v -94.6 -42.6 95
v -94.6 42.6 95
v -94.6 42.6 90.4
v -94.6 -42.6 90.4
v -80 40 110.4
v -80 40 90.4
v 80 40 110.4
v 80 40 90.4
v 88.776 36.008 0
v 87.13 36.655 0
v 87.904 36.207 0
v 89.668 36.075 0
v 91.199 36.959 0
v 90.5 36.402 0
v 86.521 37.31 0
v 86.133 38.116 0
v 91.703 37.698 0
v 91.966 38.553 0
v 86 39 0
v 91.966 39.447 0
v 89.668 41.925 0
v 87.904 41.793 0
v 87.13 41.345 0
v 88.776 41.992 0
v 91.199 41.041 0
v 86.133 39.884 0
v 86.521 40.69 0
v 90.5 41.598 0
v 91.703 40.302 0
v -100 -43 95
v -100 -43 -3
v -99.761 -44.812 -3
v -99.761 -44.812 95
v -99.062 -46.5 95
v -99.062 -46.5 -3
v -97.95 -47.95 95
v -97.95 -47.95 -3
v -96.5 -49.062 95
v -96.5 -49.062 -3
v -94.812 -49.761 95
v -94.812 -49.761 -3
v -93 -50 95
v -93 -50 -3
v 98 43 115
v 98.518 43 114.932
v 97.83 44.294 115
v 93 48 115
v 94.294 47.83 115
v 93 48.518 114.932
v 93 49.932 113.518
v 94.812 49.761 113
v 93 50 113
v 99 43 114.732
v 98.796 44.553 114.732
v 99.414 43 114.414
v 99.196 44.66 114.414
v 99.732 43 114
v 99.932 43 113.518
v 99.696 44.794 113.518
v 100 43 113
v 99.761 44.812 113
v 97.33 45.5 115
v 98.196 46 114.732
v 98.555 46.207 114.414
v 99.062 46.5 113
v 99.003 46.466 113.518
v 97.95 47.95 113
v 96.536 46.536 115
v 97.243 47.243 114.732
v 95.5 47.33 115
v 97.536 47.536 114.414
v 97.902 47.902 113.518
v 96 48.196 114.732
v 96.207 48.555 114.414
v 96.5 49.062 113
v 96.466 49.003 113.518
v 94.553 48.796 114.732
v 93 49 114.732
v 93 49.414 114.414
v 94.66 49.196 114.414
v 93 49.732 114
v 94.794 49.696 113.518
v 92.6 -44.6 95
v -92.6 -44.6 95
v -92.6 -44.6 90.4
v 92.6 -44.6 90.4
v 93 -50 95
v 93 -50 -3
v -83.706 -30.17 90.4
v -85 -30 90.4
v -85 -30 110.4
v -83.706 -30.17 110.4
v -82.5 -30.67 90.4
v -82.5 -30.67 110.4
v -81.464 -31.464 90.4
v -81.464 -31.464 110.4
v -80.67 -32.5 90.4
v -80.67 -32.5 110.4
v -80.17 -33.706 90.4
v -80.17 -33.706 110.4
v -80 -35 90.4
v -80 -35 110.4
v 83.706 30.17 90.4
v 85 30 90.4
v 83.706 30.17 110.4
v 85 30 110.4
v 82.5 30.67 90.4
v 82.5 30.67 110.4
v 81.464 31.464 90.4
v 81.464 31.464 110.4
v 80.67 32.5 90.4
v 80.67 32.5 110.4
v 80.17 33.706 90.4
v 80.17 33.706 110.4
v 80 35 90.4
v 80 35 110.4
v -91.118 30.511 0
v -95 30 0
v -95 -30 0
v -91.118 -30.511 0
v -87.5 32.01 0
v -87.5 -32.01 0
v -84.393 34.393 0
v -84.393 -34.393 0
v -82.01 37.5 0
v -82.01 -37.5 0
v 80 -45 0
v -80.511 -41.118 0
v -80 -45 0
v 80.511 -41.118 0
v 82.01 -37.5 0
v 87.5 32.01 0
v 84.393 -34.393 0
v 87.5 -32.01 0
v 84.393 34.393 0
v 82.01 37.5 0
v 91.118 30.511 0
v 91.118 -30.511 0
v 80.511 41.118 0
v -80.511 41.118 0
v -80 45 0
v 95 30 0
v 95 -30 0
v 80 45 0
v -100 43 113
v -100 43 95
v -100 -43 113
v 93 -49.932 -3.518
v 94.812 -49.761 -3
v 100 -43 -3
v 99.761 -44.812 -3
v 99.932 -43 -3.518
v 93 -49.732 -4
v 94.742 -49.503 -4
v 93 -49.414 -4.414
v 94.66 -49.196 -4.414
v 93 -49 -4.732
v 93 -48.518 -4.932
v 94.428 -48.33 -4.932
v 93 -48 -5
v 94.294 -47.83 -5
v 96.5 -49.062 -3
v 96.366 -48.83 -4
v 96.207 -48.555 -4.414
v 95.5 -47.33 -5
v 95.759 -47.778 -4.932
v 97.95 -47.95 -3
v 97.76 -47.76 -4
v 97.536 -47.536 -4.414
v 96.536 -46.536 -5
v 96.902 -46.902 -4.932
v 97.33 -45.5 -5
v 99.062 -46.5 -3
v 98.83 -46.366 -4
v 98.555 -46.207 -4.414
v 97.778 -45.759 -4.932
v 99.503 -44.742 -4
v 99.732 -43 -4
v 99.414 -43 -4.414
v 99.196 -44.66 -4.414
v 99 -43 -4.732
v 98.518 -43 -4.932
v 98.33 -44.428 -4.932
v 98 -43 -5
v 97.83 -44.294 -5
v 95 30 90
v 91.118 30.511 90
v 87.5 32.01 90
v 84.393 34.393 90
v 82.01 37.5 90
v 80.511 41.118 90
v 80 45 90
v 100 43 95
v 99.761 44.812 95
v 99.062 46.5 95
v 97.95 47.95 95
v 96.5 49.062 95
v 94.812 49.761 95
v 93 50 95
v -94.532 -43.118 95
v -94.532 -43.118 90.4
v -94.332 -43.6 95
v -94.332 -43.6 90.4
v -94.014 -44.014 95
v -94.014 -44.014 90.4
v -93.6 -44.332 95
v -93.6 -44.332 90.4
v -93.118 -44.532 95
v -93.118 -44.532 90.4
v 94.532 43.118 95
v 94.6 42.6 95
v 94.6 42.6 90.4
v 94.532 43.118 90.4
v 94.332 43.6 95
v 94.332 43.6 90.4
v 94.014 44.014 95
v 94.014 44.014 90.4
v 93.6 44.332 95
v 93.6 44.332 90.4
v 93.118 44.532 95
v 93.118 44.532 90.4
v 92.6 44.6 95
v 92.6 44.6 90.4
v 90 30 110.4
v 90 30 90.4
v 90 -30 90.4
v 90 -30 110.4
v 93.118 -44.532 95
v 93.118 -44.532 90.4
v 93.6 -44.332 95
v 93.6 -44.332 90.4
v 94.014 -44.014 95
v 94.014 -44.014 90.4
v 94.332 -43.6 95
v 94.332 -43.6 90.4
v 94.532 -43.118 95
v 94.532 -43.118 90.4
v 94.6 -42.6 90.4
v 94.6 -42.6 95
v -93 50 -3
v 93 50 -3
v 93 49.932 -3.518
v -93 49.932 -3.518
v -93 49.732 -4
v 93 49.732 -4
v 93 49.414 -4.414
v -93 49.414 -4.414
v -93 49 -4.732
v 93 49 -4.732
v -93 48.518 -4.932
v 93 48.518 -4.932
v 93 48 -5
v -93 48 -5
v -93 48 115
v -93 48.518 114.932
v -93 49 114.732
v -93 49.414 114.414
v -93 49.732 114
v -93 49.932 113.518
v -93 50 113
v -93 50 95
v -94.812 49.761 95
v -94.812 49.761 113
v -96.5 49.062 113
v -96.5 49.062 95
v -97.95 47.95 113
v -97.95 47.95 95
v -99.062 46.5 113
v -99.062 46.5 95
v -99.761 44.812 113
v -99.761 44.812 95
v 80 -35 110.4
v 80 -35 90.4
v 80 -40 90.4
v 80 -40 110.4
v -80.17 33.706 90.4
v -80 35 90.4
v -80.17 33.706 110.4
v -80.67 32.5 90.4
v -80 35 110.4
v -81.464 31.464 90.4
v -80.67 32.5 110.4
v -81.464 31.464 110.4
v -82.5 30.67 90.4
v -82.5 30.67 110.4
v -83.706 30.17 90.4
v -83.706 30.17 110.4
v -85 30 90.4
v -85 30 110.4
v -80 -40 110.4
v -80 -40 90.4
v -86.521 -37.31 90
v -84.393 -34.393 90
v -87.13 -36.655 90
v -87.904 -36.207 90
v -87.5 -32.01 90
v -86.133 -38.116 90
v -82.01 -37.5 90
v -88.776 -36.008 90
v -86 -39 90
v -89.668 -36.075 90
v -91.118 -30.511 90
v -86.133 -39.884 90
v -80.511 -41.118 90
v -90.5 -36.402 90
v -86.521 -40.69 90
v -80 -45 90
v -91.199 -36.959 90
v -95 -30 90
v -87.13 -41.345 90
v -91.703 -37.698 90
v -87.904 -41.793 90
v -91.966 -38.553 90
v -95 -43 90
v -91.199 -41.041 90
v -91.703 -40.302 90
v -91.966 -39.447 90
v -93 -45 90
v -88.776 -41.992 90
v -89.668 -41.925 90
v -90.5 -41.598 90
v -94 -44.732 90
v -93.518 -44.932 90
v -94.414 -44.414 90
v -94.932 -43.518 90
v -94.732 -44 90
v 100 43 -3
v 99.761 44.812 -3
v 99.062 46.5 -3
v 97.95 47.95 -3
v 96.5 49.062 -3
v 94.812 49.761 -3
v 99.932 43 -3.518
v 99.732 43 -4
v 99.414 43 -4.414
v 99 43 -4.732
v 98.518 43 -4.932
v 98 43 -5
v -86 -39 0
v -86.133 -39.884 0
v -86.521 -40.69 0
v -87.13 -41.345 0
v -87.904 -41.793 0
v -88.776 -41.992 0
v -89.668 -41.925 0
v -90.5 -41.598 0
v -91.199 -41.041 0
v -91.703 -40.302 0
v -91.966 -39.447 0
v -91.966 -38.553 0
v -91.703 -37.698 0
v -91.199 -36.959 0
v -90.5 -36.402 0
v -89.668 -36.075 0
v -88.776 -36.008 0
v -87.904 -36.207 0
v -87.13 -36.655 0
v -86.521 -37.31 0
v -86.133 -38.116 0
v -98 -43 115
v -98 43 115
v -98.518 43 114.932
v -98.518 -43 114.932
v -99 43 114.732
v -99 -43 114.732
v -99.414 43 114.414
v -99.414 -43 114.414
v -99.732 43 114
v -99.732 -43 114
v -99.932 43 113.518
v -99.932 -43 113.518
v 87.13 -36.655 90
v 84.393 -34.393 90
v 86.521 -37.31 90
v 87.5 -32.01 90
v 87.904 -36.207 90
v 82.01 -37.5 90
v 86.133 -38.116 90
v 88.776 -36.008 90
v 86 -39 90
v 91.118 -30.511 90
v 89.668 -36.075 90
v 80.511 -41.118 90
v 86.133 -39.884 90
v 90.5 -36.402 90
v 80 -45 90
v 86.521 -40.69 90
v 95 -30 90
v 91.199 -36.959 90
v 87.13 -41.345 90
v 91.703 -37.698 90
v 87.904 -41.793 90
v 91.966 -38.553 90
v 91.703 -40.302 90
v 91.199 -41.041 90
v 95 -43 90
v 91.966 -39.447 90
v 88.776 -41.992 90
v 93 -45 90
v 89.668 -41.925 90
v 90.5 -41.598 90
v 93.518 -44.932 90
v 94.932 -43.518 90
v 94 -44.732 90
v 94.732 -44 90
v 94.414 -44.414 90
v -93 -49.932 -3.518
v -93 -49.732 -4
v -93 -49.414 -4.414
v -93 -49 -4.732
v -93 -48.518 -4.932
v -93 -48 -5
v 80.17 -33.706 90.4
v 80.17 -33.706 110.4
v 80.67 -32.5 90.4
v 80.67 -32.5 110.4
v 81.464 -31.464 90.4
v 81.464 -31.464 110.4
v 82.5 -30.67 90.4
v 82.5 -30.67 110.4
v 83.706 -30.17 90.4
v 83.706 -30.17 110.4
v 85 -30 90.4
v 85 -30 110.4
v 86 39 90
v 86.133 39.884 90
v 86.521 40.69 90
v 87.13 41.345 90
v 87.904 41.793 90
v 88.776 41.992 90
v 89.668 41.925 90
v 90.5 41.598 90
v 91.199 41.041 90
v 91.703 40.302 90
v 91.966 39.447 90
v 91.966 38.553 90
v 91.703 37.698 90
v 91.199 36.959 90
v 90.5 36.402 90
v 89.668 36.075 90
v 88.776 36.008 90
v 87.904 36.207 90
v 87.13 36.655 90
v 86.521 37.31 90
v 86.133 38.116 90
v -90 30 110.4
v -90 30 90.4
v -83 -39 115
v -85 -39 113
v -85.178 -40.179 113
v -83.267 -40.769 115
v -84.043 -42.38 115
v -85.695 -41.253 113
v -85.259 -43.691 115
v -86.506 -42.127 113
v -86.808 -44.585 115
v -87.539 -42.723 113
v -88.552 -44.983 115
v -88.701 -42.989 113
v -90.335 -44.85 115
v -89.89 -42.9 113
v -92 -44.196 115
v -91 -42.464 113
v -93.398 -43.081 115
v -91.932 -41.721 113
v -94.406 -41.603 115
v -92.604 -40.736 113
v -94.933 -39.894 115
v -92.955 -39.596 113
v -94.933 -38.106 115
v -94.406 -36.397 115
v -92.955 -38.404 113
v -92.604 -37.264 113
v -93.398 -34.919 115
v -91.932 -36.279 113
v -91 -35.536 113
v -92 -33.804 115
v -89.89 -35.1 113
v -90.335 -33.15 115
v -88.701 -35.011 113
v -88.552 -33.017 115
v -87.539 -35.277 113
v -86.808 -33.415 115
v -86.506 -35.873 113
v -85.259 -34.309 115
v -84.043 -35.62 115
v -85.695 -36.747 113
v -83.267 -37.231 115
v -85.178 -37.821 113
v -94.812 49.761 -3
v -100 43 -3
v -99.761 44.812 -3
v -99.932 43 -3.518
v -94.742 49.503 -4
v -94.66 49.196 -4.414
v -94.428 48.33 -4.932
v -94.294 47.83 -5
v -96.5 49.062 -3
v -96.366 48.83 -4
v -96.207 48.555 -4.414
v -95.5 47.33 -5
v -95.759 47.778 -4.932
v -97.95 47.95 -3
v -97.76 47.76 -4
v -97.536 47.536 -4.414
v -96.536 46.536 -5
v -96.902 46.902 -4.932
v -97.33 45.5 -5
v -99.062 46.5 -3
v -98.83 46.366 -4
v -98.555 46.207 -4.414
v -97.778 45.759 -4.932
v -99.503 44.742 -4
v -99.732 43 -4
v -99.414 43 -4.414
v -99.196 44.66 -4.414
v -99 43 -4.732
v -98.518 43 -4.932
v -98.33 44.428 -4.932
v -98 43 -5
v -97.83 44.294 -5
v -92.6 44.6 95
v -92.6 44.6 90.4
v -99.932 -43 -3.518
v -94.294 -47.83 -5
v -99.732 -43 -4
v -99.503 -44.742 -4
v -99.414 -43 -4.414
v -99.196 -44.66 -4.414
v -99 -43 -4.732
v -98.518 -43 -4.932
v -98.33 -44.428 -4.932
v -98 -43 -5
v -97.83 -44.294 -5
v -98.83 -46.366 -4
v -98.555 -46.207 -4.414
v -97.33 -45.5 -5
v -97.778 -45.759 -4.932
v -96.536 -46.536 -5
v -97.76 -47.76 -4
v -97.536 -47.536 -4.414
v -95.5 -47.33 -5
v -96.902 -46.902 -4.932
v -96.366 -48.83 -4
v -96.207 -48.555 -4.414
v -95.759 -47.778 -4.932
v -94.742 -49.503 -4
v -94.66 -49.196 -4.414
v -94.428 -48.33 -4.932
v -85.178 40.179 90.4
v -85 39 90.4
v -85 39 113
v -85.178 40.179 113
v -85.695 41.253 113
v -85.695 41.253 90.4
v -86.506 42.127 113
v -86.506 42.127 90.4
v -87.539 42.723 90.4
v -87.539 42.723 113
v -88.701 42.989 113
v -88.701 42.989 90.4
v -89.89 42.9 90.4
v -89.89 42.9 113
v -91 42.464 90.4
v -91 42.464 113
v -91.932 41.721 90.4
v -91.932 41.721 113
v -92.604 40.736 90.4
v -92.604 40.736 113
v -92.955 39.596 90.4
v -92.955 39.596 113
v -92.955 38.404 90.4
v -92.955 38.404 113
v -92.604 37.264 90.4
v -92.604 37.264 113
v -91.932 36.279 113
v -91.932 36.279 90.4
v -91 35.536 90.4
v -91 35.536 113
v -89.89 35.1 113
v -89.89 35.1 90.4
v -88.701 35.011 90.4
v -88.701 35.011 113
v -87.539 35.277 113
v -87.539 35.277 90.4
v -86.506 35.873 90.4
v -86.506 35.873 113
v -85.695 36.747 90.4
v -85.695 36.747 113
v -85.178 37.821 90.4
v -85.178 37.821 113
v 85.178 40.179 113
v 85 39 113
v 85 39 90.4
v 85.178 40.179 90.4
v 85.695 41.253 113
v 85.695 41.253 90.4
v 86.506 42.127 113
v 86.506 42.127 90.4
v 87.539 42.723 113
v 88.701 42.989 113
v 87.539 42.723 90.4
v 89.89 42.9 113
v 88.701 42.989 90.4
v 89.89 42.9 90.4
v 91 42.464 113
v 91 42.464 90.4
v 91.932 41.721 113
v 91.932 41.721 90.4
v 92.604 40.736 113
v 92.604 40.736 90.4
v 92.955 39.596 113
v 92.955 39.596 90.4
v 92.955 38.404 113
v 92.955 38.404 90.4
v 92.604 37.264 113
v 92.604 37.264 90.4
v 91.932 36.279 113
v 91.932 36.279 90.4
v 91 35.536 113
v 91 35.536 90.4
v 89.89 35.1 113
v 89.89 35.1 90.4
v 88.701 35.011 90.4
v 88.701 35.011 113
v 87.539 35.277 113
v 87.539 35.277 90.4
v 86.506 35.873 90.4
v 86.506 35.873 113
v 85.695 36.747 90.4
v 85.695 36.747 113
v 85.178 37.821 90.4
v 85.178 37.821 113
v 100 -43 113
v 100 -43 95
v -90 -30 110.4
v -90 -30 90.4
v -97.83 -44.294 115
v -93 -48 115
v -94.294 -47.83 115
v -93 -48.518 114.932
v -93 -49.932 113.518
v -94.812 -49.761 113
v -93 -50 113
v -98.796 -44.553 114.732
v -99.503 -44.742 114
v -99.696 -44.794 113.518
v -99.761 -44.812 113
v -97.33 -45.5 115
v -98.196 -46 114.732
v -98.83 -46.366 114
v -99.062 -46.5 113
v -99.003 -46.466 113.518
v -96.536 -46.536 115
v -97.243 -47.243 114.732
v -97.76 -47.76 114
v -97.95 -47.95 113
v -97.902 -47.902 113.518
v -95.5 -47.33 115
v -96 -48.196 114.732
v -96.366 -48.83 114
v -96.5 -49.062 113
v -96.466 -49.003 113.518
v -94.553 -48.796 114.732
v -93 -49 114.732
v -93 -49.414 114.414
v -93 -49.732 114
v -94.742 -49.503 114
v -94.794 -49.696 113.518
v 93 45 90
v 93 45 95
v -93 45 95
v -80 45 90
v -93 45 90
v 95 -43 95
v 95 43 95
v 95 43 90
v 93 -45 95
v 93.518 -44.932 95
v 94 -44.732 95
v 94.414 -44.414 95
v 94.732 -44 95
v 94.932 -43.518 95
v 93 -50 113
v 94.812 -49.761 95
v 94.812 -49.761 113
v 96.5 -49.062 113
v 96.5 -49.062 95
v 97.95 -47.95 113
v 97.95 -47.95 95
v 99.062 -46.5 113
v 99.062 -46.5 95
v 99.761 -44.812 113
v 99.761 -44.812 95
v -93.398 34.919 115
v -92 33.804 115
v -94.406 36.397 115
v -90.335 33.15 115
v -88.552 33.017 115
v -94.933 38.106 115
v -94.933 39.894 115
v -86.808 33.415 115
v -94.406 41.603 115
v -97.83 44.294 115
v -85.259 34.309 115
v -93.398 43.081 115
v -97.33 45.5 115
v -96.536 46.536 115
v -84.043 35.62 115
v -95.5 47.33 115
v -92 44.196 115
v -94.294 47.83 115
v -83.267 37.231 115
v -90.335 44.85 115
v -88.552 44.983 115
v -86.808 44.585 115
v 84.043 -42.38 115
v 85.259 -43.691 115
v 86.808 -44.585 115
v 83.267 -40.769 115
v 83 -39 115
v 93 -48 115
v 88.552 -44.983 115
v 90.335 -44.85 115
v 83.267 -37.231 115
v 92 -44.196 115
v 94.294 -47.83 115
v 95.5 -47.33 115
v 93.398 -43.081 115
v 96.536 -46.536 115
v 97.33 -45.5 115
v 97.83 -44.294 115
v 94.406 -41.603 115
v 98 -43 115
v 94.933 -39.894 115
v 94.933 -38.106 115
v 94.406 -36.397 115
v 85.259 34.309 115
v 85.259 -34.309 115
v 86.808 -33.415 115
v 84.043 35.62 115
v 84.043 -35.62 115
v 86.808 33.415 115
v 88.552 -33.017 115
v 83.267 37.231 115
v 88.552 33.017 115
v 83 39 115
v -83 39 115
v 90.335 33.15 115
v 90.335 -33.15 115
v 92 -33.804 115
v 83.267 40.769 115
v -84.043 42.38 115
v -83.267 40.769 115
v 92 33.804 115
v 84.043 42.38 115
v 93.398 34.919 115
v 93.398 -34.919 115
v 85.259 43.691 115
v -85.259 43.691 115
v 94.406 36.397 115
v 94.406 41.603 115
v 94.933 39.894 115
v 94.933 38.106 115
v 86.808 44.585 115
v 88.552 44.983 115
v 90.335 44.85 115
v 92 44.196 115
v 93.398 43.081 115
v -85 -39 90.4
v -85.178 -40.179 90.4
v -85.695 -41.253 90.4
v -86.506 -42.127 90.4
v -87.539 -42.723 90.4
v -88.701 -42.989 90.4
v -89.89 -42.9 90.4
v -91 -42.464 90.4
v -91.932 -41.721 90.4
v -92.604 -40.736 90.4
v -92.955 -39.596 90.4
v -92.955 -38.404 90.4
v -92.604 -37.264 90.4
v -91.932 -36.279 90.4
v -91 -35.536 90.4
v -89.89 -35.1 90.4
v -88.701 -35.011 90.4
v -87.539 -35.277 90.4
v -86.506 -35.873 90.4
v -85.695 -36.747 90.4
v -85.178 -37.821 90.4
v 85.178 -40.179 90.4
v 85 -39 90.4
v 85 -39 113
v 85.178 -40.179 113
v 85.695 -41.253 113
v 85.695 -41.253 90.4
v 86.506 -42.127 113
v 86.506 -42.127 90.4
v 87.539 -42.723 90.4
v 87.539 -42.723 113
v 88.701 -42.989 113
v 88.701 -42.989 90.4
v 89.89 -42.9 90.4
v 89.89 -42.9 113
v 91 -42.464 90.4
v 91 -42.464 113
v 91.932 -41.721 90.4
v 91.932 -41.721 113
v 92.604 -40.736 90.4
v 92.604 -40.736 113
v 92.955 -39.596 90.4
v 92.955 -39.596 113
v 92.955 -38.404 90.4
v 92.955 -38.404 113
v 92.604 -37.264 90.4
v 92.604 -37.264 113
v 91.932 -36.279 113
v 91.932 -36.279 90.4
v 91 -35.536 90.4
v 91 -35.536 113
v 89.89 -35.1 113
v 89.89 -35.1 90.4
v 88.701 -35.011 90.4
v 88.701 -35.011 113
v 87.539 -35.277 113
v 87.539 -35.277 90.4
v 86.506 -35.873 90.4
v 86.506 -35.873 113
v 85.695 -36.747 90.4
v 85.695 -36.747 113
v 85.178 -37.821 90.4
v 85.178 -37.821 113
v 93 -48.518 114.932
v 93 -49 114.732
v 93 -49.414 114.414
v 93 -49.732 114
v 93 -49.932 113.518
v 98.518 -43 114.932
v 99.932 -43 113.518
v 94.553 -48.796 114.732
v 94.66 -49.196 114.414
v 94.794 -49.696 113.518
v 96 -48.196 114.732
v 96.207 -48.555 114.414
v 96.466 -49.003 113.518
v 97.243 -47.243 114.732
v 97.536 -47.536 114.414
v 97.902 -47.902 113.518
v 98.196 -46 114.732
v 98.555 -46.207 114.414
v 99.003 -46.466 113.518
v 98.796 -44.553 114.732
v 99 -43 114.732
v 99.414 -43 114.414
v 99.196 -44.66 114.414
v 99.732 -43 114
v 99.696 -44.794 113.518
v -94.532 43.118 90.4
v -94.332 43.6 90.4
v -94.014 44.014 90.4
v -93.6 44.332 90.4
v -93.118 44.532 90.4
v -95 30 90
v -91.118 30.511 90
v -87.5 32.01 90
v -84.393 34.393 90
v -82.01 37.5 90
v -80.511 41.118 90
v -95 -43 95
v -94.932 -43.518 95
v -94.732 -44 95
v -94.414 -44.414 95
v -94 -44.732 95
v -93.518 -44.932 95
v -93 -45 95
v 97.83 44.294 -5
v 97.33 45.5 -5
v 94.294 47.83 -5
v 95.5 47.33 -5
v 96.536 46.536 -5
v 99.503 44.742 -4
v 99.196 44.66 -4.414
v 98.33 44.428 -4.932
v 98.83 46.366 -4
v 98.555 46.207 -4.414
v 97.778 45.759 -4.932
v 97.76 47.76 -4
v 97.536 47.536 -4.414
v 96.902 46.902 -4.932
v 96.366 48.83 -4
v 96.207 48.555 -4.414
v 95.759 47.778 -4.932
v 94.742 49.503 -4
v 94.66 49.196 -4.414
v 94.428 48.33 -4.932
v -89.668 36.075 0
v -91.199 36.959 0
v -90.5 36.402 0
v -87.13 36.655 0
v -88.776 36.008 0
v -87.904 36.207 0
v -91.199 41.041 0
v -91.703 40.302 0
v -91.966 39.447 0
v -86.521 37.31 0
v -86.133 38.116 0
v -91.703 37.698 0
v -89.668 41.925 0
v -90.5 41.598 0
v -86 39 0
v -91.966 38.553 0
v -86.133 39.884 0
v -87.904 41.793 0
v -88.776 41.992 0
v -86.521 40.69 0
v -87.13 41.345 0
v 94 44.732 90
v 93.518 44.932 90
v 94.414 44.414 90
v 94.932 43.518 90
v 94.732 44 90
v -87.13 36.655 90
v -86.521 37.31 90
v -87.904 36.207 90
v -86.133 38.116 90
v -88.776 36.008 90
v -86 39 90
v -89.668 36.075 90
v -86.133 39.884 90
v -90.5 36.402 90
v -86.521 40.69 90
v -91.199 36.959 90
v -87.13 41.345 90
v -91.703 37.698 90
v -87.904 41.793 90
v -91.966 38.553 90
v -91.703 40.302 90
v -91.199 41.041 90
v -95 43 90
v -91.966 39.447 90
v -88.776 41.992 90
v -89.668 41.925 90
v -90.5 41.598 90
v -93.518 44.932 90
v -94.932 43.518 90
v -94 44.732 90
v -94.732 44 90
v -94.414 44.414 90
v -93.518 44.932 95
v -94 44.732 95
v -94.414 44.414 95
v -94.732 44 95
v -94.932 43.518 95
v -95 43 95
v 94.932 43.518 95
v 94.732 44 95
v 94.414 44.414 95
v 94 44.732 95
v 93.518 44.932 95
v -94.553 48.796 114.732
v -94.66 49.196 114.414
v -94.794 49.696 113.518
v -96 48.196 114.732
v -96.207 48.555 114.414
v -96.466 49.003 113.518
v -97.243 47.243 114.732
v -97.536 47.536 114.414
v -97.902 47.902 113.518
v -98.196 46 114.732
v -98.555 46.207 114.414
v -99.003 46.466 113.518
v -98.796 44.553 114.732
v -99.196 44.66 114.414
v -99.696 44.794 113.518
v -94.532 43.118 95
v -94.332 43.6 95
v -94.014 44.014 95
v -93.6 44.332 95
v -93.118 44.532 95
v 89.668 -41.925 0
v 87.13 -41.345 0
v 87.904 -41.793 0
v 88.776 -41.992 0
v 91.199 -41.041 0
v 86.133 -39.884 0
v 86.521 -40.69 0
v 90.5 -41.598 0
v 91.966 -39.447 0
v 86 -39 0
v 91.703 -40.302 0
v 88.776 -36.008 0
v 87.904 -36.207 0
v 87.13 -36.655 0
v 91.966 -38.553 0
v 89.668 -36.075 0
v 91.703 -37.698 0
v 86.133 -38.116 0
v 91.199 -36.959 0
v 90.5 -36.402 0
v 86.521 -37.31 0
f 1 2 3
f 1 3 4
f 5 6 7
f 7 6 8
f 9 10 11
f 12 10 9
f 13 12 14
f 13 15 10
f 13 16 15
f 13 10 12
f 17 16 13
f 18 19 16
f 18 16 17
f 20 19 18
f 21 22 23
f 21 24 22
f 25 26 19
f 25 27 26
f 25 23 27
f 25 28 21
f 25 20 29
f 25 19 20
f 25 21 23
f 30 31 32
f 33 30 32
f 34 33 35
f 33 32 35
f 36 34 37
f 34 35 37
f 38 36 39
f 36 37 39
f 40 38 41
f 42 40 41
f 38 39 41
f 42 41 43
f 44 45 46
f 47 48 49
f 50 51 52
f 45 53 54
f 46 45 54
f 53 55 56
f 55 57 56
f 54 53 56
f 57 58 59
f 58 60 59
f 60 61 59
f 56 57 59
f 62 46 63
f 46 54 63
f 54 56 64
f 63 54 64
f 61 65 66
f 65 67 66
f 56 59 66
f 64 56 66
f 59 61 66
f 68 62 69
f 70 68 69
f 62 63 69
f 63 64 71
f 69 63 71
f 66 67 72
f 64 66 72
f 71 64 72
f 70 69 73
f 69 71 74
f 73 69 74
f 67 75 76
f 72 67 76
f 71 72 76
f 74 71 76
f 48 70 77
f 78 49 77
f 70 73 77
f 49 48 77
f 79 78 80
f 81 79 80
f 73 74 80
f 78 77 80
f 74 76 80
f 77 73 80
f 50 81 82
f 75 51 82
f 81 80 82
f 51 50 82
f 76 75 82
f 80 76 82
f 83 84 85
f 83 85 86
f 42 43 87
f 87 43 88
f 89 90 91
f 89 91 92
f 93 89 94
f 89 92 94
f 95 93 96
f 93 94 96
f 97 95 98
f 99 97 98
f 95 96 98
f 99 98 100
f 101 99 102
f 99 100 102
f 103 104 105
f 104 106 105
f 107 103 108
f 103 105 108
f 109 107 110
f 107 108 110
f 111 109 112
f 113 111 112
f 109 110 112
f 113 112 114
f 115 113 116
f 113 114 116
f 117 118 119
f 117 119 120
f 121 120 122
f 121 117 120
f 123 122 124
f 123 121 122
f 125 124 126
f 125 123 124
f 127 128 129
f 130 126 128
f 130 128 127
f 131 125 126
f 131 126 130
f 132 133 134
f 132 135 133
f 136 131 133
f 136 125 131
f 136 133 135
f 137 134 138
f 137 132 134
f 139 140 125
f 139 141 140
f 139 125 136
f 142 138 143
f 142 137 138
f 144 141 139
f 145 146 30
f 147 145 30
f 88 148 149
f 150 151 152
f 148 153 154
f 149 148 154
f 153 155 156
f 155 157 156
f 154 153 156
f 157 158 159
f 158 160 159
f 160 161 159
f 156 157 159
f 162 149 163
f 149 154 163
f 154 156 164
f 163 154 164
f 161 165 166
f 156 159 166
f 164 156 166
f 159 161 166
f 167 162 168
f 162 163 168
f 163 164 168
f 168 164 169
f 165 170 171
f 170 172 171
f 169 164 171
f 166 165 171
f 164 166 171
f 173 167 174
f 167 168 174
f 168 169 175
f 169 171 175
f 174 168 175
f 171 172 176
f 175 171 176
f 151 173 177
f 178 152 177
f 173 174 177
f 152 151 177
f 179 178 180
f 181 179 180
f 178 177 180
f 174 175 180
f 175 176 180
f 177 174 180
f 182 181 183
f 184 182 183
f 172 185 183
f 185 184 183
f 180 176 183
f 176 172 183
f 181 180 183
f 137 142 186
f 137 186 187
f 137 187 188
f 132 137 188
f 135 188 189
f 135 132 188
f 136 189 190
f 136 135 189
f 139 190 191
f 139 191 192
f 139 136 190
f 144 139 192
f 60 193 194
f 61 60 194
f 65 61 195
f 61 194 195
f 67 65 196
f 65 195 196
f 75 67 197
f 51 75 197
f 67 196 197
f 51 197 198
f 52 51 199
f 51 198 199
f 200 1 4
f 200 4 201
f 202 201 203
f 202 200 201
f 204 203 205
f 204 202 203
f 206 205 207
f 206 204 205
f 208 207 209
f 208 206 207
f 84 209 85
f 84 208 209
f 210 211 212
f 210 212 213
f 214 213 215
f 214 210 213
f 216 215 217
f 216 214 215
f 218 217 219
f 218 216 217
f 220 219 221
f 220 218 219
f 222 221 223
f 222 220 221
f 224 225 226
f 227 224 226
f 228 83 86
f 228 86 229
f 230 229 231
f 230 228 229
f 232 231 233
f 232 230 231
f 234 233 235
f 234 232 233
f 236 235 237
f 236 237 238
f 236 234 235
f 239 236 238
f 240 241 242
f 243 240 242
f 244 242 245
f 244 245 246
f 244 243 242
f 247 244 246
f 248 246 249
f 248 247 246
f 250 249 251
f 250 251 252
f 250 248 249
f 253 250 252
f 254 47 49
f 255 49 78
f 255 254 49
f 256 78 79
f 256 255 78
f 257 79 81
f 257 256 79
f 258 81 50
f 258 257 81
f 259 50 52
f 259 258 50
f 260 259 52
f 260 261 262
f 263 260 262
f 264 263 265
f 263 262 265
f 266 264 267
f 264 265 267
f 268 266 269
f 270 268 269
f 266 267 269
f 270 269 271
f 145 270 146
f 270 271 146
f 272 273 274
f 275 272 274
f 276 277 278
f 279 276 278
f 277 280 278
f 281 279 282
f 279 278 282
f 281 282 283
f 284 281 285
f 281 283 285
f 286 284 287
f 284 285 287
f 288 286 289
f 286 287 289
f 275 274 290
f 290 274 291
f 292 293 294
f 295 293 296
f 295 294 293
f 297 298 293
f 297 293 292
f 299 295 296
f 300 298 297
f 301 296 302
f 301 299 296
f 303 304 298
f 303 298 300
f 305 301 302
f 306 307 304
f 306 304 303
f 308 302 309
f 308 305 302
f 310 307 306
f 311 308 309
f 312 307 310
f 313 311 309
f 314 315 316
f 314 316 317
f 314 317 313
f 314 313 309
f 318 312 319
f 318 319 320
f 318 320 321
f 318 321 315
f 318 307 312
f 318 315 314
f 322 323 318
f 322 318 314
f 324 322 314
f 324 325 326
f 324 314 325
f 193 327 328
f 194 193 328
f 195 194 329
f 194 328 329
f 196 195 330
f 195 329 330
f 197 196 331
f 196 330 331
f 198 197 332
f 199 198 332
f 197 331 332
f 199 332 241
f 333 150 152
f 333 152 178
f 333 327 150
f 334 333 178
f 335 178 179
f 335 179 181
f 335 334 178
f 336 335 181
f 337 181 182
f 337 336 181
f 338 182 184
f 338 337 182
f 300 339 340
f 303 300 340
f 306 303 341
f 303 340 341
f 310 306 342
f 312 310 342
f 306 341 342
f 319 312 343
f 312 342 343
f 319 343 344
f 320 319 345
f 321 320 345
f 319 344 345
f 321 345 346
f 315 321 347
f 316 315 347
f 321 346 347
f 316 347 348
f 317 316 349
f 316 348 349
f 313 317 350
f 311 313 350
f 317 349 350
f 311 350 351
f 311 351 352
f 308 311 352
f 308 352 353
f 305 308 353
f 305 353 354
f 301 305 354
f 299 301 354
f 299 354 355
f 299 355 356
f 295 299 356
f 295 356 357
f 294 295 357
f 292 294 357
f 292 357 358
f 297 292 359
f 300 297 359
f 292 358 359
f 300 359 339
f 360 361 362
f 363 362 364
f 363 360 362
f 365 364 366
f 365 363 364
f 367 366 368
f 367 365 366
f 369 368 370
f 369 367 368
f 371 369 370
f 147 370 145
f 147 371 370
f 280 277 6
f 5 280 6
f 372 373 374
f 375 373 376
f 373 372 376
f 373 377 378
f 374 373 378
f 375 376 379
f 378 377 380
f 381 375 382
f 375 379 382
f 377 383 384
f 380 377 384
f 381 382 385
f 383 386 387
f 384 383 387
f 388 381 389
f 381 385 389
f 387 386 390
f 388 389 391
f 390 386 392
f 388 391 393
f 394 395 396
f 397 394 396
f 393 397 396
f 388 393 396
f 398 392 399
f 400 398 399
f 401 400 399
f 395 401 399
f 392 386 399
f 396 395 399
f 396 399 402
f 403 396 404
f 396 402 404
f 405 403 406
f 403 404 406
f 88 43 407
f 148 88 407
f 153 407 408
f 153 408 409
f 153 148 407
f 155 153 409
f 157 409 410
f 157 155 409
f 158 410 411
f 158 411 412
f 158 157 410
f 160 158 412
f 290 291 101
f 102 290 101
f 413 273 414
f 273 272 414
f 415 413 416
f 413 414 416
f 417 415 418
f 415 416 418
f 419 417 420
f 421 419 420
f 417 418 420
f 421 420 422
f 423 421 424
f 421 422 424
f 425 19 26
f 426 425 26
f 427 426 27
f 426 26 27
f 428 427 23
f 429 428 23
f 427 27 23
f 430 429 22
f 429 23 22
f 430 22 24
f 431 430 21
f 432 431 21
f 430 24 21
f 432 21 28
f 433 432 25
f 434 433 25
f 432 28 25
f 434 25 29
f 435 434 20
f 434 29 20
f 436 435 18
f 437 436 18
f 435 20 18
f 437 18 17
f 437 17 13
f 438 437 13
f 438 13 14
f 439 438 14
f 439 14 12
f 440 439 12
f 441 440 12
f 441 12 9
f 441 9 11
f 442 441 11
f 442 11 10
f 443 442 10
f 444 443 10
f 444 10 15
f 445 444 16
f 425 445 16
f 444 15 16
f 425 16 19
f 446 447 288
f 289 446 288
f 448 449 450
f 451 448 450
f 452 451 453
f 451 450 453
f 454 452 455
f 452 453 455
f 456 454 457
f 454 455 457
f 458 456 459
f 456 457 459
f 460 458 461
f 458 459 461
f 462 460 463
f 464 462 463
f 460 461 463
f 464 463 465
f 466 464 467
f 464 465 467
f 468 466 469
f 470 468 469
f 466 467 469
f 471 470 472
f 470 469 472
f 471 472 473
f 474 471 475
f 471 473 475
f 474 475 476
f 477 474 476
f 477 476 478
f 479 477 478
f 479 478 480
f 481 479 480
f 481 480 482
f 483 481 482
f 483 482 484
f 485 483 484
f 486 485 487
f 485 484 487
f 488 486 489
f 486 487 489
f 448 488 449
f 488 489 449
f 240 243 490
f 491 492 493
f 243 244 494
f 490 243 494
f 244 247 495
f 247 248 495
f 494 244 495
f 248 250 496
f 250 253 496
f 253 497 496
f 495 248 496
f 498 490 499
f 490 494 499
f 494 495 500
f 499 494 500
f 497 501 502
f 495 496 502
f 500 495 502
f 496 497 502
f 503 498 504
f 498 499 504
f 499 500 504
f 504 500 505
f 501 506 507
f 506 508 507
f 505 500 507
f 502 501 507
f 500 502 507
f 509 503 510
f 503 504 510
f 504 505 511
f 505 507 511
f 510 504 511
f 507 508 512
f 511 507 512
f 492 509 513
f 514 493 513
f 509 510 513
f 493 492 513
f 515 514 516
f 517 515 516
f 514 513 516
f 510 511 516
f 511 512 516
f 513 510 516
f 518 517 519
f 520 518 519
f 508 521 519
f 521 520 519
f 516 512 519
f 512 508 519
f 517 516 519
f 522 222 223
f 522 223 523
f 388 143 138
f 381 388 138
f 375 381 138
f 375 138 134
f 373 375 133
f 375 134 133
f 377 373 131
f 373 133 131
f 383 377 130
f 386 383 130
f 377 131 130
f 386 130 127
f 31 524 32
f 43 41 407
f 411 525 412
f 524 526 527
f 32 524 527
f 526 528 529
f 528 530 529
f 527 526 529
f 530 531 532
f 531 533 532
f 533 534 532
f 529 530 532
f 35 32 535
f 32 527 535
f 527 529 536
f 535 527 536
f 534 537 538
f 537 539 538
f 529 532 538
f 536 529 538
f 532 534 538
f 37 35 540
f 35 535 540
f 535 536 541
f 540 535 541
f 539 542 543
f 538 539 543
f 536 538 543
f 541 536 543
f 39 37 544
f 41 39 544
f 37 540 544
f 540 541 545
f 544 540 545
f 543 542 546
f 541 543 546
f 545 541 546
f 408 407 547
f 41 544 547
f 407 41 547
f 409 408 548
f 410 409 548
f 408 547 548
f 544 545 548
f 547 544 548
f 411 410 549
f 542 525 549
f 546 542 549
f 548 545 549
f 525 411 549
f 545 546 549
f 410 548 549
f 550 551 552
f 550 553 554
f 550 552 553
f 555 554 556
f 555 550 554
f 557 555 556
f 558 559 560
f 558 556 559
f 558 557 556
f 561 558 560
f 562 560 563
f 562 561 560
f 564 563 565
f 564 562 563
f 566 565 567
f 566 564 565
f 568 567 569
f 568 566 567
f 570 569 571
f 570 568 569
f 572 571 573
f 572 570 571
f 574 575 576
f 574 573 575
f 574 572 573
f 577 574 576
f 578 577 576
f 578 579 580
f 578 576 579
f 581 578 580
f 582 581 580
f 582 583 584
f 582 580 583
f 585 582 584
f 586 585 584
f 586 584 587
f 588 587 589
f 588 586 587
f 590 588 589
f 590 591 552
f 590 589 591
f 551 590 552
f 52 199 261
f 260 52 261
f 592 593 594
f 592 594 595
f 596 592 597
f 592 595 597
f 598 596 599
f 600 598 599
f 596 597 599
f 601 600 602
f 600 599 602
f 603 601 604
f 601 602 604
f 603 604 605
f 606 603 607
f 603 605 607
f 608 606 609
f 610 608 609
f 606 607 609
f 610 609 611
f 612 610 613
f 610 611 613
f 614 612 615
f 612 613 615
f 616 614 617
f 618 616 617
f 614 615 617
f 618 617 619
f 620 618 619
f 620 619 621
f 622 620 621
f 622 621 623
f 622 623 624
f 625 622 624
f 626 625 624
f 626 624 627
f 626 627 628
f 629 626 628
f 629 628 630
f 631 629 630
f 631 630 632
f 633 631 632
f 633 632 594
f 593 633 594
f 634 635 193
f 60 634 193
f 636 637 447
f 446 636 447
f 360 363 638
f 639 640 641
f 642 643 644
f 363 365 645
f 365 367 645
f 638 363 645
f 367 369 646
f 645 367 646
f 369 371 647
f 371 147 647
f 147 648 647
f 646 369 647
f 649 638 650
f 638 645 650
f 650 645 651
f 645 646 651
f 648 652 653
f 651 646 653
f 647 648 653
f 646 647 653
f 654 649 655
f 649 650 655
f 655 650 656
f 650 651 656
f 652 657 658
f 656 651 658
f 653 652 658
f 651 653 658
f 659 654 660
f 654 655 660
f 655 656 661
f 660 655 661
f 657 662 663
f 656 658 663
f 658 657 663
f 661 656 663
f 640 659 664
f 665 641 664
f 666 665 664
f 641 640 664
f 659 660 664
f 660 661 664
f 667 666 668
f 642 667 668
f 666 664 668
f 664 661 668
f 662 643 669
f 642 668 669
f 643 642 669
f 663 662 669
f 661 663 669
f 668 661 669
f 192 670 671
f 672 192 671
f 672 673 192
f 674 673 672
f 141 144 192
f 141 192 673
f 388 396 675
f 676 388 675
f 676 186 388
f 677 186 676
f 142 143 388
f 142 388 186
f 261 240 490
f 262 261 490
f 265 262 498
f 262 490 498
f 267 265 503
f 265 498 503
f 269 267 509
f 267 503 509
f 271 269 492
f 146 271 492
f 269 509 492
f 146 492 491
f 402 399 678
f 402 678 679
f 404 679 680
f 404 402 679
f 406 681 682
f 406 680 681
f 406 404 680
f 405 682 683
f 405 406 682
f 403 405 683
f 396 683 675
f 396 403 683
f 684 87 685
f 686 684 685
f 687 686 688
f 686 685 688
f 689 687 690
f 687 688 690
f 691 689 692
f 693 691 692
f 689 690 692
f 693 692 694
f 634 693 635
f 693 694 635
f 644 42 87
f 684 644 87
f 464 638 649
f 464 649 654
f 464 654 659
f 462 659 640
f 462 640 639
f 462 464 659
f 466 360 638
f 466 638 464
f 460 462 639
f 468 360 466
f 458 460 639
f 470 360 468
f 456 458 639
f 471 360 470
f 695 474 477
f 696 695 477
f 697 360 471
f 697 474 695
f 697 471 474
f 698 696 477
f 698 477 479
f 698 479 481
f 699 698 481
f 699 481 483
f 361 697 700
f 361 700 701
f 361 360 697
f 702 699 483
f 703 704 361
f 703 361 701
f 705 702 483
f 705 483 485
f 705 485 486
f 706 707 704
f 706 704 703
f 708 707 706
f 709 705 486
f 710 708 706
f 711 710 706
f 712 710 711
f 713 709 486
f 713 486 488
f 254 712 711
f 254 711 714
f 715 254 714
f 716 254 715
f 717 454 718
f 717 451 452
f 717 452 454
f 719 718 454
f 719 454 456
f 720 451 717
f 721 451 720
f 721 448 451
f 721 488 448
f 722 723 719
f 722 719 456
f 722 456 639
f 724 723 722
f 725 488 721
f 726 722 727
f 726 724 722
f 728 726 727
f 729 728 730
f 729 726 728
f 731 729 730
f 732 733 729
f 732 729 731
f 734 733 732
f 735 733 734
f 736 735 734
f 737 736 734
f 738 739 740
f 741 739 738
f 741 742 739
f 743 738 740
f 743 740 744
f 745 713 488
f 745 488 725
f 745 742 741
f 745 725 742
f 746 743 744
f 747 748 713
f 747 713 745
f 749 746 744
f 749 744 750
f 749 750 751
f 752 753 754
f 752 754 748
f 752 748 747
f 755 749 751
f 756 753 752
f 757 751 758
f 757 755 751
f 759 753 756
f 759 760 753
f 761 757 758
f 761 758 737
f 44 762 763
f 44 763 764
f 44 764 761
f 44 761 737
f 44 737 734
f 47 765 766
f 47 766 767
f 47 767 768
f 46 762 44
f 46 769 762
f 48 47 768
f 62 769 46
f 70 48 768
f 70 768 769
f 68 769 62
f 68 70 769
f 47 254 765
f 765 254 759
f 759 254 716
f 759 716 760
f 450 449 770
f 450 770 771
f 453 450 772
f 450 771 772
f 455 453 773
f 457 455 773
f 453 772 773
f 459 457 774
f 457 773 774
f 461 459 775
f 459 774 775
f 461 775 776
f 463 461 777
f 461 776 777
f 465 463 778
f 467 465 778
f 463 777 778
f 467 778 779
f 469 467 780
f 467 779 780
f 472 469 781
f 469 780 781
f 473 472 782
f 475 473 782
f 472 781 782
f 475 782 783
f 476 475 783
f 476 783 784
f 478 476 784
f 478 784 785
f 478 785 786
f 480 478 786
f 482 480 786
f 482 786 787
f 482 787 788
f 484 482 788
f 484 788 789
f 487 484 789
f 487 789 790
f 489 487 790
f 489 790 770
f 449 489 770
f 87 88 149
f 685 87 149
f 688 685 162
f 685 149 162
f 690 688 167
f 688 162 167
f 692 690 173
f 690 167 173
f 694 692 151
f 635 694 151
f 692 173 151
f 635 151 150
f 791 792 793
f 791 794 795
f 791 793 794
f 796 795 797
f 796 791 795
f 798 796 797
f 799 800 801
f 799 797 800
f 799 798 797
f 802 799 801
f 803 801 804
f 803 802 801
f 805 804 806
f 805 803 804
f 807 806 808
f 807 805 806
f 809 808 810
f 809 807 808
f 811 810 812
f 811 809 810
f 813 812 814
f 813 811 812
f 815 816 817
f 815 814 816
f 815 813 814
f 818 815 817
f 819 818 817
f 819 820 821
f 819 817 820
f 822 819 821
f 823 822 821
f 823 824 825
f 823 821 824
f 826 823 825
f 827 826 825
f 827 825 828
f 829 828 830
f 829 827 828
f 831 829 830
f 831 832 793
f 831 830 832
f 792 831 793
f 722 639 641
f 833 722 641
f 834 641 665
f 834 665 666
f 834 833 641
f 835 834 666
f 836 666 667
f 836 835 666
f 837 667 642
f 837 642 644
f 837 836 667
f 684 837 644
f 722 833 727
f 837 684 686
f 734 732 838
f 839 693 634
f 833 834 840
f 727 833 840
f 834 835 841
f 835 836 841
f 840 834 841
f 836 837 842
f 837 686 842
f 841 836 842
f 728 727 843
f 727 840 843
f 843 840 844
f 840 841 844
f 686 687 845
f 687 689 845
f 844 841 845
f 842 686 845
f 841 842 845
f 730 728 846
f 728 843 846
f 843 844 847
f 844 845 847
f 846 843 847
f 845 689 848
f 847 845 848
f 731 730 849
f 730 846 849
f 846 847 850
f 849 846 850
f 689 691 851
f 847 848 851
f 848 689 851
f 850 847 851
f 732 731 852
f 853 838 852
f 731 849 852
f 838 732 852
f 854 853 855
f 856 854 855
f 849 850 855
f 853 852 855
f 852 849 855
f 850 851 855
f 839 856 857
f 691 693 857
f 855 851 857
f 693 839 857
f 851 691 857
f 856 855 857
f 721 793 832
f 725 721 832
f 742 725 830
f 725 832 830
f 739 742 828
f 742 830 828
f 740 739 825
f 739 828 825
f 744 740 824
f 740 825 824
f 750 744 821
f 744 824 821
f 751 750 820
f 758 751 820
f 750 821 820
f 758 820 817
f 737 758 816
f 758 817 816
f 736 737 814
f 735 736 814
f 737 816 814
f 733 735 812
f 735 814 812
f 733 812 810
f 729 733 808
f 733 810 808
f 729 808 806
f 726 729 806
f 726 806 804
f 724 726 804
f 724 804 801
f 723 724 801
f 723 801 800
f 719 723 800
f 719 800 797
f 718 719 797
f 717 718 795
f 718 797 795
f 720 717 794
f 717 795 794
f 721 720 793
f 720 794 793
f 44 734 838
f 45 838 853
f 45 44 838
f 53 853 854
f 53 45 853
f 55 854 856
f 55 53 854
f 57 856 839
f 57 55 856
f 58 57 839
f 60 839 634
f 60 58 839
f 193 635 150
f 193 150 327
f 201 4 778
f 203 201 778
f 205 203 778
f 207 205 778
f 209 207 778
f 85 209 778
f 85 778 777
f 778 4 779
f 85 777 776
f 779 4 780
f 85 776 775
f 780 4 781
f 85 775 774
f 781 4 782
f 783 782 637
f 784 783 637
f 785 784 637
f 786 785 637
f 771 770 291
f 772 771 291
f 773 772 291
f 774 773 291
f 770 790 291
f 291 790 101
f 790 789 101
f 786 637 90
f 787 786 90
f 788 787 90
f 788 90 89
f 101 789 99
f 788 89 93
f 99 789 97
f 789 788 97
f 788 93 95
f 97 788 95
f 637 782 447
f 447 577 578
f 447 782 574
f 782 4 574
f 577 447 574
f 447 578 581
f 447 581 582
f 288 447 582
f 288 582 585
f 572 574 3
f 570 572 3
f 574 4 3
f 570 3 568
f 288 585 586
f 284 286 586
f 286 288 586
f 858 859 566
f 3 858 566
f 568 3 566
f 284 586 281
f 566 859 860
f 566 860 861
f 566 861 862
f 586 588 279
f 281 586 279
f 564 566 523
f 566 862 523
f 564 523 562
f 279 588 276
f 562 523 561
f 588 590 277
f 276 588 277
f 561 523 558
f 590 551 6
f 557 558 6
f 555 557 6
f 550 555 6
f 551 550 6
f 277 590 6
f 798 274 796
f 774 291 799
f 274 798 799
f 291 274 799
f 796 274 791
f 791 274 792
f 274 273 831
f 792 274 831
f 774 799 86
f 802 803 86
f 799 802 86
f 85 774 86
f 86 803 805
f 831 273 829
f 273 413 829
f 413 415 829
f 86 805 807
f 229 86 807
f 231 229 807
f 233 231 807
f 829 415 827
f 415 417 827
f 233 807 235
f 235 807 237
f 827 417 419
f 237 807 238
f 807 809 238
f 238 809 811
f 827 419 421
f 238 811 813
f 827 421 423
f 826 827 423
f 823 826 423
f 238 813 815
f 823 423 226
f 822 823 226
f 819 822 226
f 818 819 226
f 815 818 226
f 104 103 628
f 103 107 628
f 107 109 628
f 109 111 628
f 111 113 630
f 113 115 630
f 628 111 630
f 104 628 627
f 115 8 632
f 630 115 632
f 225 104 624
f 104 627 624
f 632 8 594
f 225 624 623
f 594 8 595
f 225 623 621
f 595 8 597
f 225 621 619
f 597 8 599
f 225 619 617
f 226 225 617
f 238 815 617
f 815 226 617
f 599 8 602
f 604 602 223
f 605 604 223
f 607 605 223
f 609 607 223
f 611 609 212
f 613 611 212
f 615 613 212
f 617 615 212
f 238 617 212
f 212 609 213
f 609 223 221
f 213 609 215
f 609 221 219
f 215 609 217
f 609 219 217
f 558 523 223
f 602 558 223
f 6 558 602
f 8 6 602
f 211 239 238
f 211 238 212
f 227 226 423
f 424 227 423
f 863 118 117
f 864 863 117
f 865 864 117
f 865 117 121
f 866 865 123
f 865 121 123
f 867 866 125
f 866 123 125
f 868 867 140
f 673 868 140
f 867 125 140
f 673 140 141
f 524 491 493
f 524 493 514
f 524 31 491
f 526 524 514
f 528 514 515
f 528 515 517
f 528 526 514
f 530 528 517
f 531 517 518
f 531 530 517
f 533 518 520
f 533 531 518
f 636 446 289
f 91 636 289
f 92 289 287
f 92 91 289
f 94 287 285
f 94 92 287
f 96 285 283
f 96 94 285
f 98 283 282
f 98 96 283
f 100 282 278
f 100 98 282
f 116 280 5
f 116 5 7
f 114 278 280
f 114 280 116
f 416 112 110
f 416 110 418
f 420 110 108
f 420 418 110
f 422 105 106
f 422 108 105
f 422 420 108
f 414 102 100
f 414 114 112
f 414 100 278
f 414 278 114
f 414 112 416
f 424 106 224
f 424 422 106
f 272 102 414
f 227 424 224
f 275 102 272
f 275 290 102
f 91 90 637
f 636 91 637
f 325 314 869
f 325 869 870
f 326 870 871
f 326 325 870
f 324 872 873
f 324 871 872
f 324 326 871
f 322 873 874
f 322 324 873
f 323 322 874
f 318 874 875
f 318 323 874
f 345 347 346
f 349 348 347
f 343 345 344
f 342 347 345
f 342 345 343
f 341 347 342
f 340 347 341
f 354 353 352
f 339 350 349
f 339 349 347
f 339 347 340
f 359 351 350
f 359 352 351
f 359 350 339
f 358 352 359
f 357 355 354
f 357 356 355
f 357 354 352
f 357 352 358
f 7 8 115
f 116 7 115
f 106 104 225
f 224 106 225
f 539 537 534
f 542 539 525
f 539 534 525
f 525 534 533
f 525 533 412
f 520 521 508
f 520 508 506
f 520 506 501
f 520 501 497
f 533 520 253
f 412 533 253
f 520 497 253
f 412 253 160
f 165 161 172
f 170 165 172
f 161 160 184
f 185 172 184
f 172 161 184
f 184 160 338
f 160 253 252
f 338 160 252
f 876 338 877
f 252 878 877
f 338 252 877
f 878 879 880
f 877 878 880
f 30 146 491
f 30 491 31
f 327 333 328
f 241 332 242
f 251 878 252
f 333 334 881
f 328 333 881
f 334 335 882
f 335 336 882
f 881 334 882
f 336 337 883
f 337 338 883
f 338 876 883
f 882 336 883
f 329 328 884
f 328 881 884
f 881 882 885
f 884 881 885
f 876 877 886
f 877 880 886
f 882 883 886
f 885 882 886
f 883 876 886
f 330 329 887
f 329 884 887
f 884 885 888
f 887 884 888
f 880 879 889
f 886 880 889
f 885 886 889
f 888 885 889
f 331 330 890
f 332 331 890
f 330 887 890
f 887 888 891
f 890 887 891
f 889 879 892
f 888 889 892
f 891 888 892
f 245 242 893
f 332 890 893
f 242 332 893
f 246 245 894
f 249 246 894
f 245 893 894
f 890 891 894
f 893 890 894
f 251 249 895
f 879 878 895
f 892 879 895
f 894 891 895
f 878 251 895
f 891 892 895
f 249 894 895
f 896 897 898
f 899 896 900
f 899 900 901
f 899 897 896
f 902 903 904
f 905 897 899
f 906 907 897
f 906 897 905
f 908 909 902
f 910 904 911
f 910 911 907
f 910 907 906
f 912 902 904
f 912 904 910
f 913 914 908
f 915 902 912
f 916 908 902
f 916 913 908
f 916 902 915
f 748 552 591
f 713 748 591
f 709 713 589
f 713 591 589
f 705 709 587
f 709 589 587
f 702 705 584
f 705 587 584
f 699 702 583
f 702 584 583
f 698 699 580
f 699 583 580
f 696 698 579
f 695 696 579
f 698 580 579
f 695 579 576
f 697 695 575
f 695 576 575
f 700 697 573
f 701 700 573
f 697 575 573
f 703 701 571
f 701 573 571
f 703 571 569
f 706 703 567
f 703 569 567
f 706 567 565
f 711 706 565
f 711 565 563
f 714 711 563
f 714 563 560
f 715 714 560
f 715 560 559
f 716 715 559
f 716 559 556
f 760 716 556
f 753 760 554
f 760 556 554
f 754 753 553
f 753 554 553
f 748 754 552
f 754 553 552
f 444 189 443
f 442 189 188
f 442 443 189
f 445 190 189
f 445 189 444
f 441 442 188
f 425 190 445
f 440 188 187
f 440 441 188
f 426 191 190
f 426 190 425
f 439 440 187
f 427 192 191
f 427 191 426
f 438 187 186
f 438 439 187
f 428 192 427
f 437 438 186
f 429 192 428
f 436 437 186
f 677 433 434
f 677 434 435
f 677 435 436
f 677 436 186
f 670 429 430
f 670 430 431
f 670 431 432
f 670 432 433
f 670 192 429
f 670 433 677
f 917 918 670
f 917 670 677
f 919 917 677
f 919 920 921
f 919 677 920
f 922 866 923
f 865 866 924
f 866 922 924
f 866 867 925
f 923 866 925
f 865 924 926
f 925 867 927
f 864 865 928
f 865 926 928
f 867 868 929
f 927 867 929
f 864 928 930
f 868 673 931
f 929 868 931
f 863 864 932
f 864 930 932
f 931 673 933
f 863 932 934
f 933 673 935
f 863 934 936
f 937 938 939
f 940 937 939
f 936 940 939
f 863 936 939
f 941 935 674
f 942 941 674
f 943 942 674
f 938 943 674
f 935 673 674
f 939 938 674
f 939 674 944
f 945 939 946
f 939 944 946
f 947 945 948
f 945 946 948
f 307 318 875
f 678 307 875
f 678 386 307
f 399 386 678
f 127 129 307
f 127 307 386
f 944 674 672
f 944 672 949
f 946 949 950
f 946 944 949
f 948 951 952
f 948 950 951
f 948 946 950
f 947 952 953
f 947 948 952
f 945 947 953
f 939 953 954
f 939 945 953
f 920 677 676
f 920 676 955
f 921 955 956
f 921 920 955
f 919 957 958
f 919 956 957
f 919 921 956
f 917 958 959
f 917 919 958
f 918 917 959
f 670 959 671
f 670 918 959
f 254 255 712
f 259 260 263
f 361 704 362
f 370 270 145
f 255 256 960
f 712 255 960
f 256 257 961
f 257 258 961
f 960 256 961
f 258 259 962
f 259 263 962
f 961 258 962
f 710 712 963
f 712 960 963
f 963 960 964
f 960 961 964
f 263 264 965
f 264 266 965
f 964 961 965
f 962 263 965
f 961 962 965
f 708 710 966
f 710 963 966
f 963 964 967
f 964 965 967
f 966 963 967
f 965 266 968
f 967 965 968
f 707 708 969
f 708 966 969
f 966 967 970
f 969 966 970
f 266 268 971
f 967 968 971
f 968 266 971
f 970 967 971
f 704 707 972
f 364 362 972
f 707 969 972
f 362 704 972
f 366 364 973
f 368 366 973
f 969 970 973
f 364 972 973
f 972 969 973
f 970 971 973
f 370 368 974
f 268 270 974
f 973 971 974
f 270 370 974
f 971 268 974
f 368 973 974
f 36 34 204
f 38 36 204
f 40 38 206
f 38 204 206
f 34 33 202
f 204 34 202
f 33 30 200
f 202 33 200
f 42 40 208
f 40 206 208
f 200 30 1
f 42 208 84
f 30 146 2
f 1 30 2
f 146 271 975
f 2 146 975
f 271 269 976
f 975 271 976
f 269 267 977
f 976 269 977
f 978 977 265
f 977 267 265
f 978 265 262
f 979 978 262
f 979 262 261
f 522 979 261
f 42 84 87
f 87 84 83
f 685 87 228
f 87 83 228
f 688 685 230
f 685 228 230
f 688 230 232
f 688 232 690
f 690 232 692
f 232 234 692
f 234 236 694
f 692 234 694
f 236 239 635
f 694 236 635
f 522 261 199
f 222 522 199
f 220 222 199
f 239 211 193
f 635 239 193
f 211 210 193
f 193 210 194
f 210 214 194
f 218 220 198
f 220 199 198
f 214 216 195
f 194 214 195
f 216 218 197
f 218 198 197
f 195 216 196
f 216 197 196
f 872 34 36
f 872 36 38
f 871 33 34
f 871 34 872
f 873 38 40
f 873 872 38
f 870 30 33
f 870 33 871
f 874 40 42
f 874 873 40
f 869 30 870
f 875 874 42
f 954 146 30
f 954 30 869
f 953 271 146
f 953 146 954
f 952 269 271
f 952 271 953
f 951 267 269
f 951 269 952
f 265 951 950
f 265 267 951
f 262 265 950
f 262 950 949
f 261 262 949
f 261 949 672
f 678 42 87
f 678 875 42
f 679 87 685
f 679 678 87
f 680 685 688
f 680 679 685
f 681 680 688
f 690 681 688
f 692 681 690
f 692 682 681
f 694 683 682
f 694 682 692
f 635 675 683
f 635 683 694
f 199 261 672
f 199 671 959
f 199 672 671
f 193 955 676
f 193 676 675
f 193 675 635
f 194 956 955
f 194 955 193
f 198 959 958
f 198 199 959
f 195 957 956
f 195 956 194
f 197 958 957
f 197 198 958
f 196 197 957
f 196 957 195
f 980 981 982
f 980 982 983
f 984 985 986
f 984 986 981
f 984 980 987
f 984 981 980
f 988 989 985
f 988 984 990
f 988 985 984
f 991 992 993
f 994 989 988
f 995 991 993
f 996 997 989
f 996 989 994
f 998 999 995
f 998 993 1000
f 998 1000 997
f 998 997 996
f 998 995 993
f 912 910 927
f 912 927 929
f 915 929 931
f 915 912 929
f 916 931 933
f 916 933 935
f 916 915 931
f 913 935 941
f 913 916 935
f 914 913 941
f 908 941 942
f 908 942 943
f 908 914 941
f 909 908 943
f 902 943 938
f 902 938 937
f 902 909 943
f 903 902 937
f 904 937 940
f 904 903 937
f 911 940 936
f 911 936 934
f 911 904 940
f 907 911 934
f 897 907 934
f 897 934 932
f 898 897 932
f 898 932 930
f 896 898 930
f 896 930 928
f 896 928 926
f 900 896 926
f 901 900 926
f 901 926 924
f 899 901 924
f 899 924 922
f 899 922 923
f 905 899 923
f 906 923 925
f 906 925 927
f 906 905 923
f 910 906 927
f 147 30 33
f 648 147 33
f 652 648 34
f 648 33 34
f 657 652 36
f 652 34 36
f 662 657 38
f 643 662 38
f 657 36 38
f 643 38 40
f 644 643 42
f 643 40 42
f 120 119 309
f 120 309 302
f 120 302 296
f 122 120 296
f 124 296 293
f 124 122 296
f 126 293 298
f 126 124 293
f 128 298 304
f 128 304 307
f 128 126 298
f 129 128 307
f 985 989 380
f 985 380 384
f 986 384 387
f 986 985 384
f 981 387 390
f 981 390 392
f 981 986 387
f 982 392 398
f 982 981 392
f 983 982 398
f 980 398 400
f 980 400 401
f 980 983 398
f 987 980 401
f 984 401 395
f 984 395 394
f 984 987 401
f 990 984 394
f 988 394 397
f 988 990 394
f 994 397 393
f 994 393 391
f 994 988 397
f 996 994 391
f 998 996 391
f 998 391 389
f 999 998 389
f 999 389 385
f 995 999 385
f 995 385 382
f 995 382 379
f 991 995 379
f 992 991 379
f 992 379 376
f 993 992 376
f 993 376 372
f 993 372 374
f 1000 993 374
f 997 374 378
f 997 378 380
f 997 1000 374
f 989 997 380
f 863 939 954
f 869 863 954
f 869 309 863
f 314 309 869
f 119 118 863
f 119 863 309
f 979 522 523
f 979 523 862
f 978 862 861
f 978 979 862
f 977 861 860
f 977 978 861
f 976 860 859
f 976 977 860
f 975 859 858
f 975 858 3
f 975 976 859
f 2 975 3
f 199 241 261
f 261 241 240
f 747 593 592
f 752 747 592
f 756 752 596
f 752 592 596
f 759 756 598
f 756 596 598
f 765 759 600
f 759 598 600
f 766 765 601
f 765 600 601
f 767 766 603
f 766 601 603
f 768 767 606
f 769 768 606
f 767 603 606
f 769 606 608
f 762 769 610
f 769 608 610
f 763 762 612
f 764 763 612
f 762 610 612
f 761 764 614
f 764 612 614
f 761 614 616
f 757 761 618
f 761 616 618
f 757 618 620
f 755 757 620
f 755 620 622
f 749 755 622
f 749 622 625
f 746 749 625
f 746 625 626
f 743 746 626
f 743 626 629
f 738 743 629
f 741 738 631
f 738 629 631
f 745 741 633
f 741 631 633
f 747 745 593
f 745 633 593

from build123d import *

# Parameters (mm, degrees)
PAD_DEPTH                     = 100
POCKET_DEPTH                  = 95.001
SKETCH002_R                   = 3
PAD001_DEPTH                  = 90
SKETCH002_MIRRORED_2_R        = 3
PAD001_MIRRORED_2_DEPTH       = 90
FILLET_R                      = 2
PAD002_DEPTH                  = 20
PAD003_DEPTH                  = 4.6
SKETCH005_R                   = 4
POCKET001_DEPTH               = 564.912814
SKETCH005_MIRRORED002_2_R     = 4
POCKET001_MIRRORED002_2_DEPTH = 564.912814
CHAMFER_SIZE                  = 2
FILLET001_R                   = 2
POCKET002_DEPTH               = 20
FILLET002_R                   = 5


with BuildPart() as body:
    # Sketch → Pad (new body)
    with BuildSketch(Plane.XY.offset(-5)):
        with BuildLine():
            Line((100, -43), (100, 43))
            ThreePointArc((100, 43), (97.949747, 47.949747), (93, 50))
            Line((93, 50), (-93, 50))
            ThreePointArc((-93, 50), (-97.949747, 47.949747), (-100, 43))
            Line((-100, 43), (-100, -43))
            ThreePointArc((-100, -43), (-97.949747, -47.949747), (-93, -50))
            Line((-93, -50), (93, -50))
            ThreePointArc((93, -50), (97.949747, -47.949747), (100, -43))
        make_face()
    extrude(amount=PAD_DEPTH)

    # Sketch001 → Pocket (cut, through all)
    with BuildSketch(Plane.XY):
        with BuildLine():
            Line((95, -43), (95, 43))
            ThreePointArc((95, 43), (94.414214, 44.414214), (93, 45))
            Line((93, 45), (-93, 45))
            ThreePointArc((-93, 45), (-94.414214, 44.414214), (-95, 43))
            Line((-95, 43), (-95, -43))
            ThreePointArc((-95, -43), (-94.414214, -44.414214), (-93, -45))
            Line((-93, -45), (93, -45))
            ThreePointArc((93, -45), (94.414214, -44.414214), (95, -43))
        make_face()
    extrude(amount=POCKET_DEPTH, mode=Mode.SUBTRACT)

    # Sketch002 → Pad001 (join)
    with BuildSketch(Plane.XY):
        with BuildLine():
            Line((-95, 45), (-80, 45))
            ThreePointArc((-95, 30), (-84.393398, 34.393398), (-80, 45))
            Line((-95, 45), (-95, 30))
        make_face()
        with Locations((-89, 39)):
            Circle(SKETCH002_R, mode=Mode.SUBTRACT)
    pad001 = extrude(amount=PAD001_DEPTH)

    # Sketch002 Mirrored 2 → Pad001 Mirrored 2 (add)
    with BuildSketch(Plane(origin=(0, 0, 0), x_dir=(-1, 0, 0), z_dir=(0, 0, -1))):
        with BuildLine():
            Line((-95, 45), (-80, 45))
            ThreePointArc((-95, 30), (-84.393398, 34.393398), (-80, 45))
            Line((-95, 45), (-95, 30))
        make_face()
        with Locations((-89, 39)):
            Circle(SKETCH002_MIRRORED_2_R, mode=Mode.SUBTRACT)
    pad001_mirrored_2 = extrude(amount=-PAD001_MIRRORED_2_DEPTH)

    # Mirrored001: Pad001, Pad001 Mirrored 2 across Sketch002 H_Axis
    add(pad001.mirror(Plane.ZX))
    add(pad001_mirrored_2.mirror(Plane.ZX))

    # Fillet
    fillet_edges = [body.edges().sort_by_distance(p)[0] for p in [
        (0, -50, -5),
    ]]
    fillet(fillet_edges, radius=FILLET_R)


with BuildPart() as body001:
    # Sketch003 → Pad002 (new body)
    with BuildSketch(Plane.XY.offset(95)):
        with BuildLine():
            Line((100, -43), (100, 43))
            ThreePointArc((100, 43), (97.949747, 47.949747), (93, 50))
            Line((93, 50), (-93, 50))
            ThreePointArc((-93, 50), (-97.949747, 47.949747), (-100, 43))
            Line((-100, 43), (-100, -43))
            ThreePointArc((-100, -43), (-97.949747, -47.949747), (-93, -50))
            Line((-93, -50), (93, -50))
            ThreePointArc((93, -50), (97.949747, -47.949747), (100, -43))
        make_face()
    extrude(amount=PAD002_DEPTH)

    # Sketch004 → Pad003 (join)
    with BuildSketch(Plane.XY.offset(95)):
        with BuildLine():
            Line((94.6, -42.6), (94.6, 42.6))
            ThreePointArc((94.6, 42.6), (94.014214, 44.014214), (92.6, 44.6))
            Line((92.6, 44.6), (-92.6, 44.6))
            ThreePointArc((-92.6, 44.6), (-94.014214, 44.014214), (-94.6, 42.6))
            Line((-94.6, 42.6), (-94.6, -42.6))
            ThreePointArc((-94.6, -42.6), (-94.014214, -44.014214), (-92.6, -44.6))
            Line((-92.6, -44.6), (92.6, -44.6))
            ThreePointArc((92.6, -44.6), (94.014214, -44.014214), (94.6, -42.6))
        make_face()
    extrude(amount=-PAD003_DEPTH)

    # Sketch005 → Pocket001 (cut, through all)
    with BuildSketch(Plane.XY):
        with Locations((-89, 39)):
            Circle(SKETCH005_R)
    pocket001 = extrude(amount=POCKET001_DEPTH, mode=Mode.SUBTRACT)

    # Sketch005 Mirrored002 2 → Pocket001 Mirrored002 2 (cut, through all)
    with BuildSketch(Plane(origin=(0, 0, 0), x_dir=(1, 0, 0), z_dir=(0, 0, -1))):
        with Locations((-89, 39)):
            Circle(SKETCH005_MIRRORED002_2_R)
    pocket001_mirrored002_2 = extrude(amount=-POCKET001_MIRRORED002_2_DEPTH, mode=Mode.SUBTRACT)

    # Mirrored003: Pocket001, Pocket001 Mirrored002 2 across YZ
    add(pocket001.mirror(Plane.YZ), mode=Mode.SUBTRACT)
    add(pocket001_mirrored002_2.mirror(Plane.YZ), mode=Mode.SUBTRACT)

    # Chamfer
    chamfer_edges = [body001.edges().sort_by_distance(p)[0] for p in [
        (93, 39, 115),
        (-93, 39, 115),
        (-93, -39, 115),
        (93, -39, 115),
    ]]
    chamfer(chamfer_edges, length=CHAMFER_SIZE)

    # Fillet001
    fillet001_edges = [body001.edges().sort_by_distance(p)[0] for p in [
        (0, -50, 115),
    ]]
    fillet(fillet001_edges, radius=FILLET001_R)

    # Sketch006 (on Face27 of Fillet001) → Pocket002 (cut)
    with BuildSketch(Plane(origin=(0, 0, 90.4), x_dir=(1, 0, 0), z_dir=(0, 0, -1))):
        Polygon((90, -30), (90, 30), (80, 30), (80, 40), (-80, 40), (-80, 30), (-90, 30), (-90, -30), (-80, -30), (-80, -40), (80, -40), (80, -30), align=None)
    extrude(amount=-POCKET002_DEPTH, mode=Mode.SUBTRACT)

    # Fillet002
    fillet002_edges = [body001.edges().sort_by_distance(p)[0] for p in [
        (-80, -30, 100.4),
        (80, -30, 100.4),
        (-80, 30, 100.4),
        (80, 30, 100.4),
    ]]
    fillet(fillet002_edges, radius=FILLET002_R)


solid = Compound([body.part, body001.part])
